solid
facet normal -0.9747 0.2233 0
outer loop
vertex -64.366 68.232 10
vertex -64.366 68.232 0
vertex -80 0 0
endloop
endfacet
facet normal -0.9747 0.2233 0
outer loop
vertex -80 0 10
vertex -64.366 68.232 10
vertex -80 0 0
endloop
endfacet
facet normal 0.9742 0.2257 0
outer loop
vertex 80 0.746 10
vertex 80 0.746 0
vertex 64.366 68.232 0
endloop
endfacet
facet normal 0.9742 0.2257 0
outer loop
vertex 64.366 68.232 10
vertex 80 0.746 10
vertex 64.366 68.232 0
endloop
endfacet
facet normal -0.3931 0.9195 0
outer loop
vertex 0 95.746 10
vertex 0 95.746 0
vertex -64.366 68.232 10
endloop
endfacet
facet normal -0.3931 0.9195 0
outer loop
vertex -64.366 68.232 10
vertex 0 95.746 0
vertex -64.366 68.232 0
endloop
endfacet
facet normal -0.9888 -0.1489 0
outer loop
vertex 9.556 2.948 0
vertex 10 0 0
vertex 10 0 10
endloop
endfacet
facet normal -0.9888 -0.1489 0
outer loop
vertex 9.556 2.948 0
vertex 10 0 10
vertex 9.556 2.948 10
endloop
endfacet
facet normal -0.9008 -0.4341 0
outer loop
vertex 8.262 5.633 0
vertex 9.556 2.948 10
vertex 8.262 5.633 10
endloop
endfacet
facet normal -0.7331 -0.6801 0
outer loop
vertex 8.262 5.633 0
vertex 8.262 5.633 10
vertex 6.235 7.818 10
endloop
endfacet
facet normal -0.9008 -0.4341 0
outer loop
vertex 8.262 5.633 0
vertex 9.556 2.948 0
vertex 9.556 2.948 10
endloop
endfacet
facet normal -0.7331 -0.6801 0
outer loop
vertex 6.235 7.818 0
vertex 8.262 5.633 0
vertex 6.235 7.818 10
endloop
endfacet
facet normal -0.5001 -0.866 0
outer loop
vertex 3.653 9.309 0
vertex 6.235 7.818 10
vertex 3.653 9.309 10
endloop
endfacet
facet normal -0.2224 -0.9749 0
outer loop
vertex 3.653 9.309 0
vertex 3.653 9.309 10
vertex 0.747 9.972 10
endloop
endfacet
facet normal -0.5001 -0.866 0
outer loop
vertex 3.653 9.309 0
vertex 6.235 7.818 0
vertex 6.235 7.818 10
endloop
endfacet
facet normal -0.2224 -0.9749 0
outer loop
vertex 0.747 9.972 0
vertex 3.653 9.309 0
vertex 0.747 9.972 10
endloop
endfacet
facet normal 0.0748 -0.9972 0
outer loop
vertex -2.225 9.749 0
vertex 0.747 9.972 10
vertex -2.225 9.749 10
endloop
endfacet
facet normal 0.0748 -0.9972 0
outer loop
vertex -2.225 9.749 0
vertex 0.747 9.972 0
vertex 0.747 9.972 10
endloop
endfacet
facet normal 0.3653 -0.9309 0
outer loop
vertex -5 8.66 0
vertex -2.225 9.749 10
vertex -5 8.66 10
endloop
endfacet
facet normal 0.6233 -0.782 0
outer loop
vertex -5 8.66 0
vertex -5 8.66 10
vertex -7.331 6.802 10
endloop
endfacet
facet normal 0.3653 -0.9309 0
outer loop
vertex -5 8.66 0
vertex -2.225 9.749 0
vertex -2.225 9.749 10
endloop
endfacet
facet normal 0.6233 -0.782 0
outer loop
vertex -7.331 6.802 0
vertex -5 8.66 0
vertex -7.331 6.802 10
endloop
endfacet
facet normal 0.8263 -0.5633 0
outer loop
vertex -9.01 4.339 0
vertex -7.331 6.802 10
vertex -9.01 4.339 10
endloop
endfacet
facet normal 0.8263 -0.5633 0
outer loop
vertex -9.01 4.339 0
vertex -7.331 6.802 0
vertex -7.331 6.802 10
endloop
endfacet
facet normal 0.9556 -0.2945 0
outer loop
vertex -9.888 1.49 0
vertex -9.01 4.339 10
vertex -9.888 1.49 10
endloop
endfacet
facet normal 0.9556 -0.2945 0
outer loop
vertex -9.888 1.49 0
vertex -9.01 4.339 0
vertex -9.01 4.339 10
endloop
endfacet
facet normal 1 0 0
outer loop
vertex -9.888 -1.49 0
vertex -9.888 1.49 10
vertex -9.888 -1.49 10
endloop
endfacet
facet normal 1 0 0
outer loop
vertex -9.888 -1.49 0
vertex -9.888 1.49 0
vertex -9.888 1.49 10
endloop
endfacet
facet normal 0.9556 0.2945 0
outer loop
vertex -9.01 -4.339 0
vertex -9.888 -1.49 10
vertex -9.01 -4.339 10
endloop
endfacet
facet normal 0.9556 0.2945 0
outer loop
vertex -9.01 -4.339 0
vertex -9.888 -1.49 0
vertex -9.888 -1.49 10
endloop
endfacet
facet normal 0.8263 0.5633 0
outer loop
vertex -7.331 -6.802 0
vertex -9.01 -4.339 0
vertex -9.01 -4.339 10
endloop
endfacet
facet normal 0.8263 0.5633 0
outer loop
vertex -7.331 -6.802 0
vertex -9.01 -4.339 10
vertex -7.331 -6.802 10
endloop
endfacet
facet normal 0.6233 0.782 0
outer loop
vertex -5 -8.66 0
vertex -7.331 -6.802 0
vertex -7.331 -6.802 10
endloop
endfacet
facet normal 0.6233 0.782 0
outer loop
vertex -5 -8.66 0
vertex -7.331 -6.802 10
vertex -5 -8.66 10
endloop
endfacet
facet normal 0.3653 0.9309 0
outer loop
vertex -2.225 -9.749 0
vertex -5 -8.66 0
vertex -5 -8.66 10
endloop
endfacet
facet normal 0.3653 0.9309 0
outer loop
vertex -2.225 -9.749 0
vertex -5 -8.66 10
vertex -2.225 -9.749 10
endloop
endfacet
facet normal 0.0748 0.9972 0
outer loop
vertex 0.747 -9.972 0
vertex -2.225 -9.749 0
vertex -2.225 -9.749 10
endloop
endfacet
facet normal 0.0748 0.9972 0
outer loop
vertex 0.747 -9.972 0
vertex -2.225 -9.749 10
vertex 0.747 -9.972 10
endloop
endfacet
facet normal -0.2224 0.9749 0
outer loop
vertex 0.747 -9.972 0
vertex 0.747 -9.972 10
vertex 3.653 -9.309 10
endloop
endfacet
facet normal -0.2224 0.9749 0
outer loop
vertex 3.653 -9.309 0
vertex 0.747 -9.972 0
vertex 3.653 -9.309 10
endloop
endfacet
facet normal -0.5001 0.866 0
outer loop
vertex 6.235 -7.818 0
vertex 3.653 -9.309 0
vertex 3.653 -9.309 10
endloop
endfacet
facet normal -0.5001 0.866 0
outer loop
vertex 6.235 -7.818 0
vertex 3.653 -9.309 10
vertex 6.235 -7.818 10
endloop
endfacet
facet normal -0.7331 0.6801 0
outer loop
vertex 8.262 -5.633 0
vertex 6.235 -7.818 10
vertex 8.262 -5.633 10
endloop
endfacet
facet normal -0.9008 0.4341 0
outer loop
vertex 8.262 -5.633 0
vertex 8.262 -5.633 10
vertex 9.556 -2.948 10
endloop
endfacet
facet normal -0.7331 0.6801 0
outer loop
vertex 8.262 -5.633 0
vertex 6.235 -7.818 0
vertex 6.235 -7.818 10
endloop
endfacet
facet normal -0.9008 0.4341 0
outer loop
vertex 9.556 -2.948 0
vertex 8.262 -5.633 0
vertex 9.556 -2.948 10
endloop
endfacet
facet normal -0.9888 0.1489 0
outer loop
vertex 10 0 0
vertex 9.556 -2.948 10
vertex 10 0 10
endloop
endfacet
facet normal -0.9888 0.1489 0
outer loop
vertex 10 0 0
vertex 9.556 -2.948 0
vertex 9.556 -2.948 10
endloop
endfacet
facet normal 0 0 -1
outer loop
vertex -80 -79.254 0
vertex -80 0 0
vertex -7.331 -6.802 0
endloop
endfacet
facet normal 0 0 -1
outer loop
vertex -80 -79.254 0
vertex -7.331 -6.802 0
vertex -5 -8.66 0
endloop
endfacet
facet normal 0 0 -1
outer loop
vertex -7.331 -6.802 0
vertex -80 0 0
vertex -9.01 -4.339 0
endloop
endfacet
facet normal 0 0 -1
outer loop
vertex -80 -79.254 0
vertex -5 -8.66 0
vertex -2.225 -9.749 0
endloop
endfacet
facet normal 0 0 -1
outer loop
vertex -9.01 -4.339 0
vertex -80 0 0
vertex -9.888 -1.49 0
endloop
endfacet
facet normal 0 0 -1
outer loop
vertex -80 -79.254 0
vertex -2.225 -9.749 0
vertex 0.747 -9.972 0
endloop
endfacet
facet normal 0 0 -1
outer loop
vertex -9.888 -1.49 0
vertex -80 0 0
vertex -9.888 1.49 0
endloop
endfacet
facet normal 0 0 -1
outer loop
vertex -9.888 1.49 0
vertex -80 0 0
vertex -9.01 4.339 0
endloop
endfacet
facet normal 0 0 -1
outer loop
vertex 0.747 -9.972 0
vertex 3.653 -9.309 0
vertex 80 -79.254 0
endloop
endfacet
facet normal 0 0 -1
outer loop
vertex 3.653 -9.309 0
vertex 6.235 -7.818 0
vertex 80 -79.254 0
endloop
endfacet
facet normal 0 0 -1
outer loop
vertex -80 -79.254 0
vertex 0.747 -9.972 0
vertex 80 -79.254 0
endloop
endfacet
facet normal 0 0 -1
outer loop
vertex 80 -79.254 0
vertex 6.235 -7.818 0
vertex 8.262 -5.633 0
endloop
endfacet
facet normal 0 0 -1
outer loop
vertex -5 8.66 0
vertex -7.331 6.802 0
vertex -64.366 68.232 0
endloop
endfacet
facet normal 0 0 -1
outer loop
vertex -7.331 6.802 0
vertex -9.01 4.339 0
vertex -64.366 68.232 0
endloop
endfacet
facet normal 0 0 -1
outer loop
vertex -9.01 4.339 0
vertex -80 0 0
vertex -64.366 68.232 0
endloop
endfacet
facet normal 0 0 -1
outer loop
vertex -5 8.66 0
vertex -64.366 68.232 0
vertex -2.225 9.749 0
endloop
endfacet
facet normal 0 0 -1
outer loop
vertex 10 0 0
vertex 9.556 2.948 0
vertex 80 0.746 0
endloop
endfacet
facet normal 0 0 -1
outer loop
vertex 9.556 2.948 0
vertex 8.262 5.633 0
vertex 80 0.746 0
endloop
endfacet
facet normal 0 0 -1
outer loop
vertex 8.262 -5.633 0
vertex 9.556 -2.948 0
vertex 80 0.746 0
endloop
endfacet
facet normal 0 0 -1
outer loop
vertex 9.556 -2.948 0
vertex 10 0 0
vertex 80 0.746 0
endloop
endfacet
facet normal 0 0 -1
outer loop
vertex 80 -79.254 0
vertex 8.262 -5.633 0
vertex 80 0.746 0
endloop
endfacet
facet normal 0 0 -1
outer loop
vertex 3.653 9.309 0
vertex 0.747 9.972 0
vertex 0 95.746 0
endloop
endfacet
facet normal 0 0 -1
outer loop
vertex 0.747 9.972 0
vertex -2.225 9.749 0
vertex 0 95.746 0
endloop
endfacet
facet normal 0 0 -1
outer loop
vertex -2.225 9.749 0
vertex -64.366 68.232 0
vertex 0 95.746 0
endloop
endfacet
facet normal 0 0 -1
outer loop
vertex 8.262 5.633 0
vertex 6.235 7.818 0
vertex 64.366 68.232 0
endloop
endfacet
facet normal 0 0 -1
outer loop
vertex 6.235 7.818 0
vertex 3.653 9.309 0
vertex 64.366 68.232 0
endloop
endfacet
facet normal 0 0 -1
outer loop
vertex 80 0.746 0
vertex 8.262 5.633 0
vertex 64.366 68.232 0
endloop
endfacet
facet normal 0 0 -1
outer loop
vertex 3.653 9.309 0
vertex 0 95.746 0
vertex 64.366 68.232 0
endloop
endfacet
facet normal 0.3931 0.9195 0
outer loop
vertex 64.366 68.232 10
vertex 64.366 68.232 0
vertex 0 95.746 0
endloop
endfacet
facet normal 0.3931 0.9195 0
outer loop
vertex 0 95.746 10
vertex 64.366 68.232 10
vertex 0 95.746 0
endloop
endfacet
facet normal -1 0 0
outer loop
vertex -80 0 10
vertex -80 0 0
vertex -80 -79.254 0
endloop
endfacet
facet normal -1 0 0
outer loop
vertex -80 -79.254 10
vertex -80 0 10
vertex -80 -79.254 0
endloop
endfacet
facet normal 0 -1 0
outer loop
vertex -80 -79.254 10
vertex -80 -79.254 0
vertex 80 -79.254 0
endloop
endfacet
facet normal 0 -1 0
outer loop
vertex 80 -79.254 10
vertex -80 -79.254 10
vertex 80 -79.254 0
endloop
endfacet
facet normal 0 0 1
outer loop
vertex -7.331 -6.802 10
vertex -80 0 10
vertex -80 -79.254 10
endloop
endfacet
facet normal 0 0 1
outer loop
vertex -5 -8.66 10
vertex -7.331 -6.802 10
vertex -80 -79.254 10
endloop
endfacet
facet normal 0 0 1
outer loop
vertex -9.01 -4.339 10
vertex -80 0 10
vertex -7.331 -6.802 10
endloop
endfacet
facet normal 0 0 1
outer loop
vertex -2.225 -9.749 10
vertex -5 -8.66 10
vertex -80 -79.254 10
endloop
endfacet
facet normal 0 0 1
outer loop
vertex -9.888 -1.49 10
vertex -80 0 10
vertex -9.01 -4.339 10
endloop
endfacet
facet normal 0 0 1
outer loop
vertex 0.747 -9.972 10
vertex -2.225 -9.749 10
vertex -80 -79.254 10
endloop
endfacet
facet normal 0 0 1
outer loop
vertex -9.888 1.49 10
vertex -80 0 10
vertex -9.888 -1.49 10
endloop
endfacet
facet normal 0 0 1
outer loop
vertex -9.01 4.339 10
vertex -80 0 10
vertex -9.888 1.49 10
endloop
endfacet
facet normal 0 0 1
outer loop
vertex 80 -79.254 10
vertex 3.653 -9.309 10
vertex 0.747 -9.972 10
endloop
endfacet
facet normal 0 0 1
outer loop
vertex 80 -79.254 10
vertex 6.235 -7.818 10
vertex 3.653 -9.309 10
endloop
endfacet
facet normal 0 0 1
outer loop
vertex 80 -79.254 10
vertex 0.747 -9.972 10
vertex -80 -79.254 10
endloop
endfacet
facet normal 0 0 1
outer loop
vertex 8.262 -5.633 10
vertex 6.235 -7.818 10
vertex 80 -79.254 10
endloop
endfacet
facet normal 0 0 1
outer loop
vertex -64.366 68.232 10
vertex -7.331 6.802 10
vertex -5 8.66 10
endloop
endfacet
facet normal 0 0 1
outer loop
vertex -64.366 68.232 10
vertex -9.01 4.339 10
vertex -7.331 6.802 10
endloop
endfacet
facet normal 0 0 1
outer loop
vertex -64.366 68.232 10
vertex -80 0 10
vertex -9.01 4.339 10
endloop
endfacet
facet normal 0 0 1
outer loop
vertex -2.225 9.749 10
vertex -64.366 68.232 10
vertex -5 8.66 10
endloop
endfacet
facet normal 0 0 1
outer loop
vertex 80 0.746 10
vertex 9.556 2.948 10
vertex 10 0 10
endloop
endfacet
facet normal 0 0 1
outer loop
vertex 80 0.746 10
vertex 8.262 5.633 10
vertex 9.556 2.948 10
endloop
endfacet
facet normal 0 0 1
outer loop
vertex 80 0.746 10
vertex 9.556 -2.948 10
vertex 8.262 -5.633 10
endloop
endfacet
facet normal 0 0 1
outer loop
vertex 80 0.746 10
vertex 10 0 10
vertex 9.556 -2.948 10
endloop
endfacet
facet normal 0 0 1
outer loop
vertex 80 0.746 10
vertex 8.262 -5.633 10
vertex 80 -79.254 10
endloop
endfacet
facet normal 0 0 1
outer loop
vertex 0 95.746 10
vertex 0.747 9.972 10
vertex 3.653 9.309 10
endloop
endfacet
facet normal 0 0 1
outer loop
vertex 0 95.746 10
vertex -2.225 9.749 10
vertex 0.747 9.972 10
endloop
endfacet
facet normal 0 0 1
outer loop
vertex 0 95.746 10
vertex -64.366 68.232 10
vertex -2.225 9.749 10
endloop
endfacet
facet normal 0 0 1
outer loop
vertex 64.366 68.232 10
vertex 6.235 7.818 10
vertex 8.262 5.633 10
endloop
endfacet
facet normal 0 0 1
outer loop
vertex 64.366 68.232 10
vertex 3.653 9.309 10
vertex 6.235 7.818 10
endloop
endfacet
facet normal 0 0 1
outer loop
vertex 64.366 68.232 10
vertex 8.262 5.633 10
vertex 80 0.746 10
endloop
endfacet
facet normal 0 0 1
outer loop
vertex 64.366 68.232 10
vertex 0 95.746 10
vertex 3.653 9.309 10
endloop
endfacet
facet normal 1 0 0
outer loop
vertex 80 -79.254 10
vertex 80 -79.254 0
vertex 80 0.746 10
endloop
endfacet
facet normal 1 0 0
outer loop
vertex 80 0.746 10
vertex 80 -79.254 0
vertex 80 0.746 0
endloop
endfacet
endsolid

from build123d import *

# Parameters (mm, degrees)
F0_R     = 10
F1_DEPTH = 10


with BuildPart() as f1:
    # F0 (on Top) → F1 (new body)
    with BuildSketch(Plane.XY):
        Polygon((-80, 0), (-80, -79.253925), (80, -79.253925), (80, 0.746075), (64.365849, 68.231762), (0, 95.746075), (-64.365849, 68.231762), align=None)
        Circle(F0_R, mode=Mode.SUBTRACT)
    extrude(amount=F1_DEPTH)


solid = f1.part
